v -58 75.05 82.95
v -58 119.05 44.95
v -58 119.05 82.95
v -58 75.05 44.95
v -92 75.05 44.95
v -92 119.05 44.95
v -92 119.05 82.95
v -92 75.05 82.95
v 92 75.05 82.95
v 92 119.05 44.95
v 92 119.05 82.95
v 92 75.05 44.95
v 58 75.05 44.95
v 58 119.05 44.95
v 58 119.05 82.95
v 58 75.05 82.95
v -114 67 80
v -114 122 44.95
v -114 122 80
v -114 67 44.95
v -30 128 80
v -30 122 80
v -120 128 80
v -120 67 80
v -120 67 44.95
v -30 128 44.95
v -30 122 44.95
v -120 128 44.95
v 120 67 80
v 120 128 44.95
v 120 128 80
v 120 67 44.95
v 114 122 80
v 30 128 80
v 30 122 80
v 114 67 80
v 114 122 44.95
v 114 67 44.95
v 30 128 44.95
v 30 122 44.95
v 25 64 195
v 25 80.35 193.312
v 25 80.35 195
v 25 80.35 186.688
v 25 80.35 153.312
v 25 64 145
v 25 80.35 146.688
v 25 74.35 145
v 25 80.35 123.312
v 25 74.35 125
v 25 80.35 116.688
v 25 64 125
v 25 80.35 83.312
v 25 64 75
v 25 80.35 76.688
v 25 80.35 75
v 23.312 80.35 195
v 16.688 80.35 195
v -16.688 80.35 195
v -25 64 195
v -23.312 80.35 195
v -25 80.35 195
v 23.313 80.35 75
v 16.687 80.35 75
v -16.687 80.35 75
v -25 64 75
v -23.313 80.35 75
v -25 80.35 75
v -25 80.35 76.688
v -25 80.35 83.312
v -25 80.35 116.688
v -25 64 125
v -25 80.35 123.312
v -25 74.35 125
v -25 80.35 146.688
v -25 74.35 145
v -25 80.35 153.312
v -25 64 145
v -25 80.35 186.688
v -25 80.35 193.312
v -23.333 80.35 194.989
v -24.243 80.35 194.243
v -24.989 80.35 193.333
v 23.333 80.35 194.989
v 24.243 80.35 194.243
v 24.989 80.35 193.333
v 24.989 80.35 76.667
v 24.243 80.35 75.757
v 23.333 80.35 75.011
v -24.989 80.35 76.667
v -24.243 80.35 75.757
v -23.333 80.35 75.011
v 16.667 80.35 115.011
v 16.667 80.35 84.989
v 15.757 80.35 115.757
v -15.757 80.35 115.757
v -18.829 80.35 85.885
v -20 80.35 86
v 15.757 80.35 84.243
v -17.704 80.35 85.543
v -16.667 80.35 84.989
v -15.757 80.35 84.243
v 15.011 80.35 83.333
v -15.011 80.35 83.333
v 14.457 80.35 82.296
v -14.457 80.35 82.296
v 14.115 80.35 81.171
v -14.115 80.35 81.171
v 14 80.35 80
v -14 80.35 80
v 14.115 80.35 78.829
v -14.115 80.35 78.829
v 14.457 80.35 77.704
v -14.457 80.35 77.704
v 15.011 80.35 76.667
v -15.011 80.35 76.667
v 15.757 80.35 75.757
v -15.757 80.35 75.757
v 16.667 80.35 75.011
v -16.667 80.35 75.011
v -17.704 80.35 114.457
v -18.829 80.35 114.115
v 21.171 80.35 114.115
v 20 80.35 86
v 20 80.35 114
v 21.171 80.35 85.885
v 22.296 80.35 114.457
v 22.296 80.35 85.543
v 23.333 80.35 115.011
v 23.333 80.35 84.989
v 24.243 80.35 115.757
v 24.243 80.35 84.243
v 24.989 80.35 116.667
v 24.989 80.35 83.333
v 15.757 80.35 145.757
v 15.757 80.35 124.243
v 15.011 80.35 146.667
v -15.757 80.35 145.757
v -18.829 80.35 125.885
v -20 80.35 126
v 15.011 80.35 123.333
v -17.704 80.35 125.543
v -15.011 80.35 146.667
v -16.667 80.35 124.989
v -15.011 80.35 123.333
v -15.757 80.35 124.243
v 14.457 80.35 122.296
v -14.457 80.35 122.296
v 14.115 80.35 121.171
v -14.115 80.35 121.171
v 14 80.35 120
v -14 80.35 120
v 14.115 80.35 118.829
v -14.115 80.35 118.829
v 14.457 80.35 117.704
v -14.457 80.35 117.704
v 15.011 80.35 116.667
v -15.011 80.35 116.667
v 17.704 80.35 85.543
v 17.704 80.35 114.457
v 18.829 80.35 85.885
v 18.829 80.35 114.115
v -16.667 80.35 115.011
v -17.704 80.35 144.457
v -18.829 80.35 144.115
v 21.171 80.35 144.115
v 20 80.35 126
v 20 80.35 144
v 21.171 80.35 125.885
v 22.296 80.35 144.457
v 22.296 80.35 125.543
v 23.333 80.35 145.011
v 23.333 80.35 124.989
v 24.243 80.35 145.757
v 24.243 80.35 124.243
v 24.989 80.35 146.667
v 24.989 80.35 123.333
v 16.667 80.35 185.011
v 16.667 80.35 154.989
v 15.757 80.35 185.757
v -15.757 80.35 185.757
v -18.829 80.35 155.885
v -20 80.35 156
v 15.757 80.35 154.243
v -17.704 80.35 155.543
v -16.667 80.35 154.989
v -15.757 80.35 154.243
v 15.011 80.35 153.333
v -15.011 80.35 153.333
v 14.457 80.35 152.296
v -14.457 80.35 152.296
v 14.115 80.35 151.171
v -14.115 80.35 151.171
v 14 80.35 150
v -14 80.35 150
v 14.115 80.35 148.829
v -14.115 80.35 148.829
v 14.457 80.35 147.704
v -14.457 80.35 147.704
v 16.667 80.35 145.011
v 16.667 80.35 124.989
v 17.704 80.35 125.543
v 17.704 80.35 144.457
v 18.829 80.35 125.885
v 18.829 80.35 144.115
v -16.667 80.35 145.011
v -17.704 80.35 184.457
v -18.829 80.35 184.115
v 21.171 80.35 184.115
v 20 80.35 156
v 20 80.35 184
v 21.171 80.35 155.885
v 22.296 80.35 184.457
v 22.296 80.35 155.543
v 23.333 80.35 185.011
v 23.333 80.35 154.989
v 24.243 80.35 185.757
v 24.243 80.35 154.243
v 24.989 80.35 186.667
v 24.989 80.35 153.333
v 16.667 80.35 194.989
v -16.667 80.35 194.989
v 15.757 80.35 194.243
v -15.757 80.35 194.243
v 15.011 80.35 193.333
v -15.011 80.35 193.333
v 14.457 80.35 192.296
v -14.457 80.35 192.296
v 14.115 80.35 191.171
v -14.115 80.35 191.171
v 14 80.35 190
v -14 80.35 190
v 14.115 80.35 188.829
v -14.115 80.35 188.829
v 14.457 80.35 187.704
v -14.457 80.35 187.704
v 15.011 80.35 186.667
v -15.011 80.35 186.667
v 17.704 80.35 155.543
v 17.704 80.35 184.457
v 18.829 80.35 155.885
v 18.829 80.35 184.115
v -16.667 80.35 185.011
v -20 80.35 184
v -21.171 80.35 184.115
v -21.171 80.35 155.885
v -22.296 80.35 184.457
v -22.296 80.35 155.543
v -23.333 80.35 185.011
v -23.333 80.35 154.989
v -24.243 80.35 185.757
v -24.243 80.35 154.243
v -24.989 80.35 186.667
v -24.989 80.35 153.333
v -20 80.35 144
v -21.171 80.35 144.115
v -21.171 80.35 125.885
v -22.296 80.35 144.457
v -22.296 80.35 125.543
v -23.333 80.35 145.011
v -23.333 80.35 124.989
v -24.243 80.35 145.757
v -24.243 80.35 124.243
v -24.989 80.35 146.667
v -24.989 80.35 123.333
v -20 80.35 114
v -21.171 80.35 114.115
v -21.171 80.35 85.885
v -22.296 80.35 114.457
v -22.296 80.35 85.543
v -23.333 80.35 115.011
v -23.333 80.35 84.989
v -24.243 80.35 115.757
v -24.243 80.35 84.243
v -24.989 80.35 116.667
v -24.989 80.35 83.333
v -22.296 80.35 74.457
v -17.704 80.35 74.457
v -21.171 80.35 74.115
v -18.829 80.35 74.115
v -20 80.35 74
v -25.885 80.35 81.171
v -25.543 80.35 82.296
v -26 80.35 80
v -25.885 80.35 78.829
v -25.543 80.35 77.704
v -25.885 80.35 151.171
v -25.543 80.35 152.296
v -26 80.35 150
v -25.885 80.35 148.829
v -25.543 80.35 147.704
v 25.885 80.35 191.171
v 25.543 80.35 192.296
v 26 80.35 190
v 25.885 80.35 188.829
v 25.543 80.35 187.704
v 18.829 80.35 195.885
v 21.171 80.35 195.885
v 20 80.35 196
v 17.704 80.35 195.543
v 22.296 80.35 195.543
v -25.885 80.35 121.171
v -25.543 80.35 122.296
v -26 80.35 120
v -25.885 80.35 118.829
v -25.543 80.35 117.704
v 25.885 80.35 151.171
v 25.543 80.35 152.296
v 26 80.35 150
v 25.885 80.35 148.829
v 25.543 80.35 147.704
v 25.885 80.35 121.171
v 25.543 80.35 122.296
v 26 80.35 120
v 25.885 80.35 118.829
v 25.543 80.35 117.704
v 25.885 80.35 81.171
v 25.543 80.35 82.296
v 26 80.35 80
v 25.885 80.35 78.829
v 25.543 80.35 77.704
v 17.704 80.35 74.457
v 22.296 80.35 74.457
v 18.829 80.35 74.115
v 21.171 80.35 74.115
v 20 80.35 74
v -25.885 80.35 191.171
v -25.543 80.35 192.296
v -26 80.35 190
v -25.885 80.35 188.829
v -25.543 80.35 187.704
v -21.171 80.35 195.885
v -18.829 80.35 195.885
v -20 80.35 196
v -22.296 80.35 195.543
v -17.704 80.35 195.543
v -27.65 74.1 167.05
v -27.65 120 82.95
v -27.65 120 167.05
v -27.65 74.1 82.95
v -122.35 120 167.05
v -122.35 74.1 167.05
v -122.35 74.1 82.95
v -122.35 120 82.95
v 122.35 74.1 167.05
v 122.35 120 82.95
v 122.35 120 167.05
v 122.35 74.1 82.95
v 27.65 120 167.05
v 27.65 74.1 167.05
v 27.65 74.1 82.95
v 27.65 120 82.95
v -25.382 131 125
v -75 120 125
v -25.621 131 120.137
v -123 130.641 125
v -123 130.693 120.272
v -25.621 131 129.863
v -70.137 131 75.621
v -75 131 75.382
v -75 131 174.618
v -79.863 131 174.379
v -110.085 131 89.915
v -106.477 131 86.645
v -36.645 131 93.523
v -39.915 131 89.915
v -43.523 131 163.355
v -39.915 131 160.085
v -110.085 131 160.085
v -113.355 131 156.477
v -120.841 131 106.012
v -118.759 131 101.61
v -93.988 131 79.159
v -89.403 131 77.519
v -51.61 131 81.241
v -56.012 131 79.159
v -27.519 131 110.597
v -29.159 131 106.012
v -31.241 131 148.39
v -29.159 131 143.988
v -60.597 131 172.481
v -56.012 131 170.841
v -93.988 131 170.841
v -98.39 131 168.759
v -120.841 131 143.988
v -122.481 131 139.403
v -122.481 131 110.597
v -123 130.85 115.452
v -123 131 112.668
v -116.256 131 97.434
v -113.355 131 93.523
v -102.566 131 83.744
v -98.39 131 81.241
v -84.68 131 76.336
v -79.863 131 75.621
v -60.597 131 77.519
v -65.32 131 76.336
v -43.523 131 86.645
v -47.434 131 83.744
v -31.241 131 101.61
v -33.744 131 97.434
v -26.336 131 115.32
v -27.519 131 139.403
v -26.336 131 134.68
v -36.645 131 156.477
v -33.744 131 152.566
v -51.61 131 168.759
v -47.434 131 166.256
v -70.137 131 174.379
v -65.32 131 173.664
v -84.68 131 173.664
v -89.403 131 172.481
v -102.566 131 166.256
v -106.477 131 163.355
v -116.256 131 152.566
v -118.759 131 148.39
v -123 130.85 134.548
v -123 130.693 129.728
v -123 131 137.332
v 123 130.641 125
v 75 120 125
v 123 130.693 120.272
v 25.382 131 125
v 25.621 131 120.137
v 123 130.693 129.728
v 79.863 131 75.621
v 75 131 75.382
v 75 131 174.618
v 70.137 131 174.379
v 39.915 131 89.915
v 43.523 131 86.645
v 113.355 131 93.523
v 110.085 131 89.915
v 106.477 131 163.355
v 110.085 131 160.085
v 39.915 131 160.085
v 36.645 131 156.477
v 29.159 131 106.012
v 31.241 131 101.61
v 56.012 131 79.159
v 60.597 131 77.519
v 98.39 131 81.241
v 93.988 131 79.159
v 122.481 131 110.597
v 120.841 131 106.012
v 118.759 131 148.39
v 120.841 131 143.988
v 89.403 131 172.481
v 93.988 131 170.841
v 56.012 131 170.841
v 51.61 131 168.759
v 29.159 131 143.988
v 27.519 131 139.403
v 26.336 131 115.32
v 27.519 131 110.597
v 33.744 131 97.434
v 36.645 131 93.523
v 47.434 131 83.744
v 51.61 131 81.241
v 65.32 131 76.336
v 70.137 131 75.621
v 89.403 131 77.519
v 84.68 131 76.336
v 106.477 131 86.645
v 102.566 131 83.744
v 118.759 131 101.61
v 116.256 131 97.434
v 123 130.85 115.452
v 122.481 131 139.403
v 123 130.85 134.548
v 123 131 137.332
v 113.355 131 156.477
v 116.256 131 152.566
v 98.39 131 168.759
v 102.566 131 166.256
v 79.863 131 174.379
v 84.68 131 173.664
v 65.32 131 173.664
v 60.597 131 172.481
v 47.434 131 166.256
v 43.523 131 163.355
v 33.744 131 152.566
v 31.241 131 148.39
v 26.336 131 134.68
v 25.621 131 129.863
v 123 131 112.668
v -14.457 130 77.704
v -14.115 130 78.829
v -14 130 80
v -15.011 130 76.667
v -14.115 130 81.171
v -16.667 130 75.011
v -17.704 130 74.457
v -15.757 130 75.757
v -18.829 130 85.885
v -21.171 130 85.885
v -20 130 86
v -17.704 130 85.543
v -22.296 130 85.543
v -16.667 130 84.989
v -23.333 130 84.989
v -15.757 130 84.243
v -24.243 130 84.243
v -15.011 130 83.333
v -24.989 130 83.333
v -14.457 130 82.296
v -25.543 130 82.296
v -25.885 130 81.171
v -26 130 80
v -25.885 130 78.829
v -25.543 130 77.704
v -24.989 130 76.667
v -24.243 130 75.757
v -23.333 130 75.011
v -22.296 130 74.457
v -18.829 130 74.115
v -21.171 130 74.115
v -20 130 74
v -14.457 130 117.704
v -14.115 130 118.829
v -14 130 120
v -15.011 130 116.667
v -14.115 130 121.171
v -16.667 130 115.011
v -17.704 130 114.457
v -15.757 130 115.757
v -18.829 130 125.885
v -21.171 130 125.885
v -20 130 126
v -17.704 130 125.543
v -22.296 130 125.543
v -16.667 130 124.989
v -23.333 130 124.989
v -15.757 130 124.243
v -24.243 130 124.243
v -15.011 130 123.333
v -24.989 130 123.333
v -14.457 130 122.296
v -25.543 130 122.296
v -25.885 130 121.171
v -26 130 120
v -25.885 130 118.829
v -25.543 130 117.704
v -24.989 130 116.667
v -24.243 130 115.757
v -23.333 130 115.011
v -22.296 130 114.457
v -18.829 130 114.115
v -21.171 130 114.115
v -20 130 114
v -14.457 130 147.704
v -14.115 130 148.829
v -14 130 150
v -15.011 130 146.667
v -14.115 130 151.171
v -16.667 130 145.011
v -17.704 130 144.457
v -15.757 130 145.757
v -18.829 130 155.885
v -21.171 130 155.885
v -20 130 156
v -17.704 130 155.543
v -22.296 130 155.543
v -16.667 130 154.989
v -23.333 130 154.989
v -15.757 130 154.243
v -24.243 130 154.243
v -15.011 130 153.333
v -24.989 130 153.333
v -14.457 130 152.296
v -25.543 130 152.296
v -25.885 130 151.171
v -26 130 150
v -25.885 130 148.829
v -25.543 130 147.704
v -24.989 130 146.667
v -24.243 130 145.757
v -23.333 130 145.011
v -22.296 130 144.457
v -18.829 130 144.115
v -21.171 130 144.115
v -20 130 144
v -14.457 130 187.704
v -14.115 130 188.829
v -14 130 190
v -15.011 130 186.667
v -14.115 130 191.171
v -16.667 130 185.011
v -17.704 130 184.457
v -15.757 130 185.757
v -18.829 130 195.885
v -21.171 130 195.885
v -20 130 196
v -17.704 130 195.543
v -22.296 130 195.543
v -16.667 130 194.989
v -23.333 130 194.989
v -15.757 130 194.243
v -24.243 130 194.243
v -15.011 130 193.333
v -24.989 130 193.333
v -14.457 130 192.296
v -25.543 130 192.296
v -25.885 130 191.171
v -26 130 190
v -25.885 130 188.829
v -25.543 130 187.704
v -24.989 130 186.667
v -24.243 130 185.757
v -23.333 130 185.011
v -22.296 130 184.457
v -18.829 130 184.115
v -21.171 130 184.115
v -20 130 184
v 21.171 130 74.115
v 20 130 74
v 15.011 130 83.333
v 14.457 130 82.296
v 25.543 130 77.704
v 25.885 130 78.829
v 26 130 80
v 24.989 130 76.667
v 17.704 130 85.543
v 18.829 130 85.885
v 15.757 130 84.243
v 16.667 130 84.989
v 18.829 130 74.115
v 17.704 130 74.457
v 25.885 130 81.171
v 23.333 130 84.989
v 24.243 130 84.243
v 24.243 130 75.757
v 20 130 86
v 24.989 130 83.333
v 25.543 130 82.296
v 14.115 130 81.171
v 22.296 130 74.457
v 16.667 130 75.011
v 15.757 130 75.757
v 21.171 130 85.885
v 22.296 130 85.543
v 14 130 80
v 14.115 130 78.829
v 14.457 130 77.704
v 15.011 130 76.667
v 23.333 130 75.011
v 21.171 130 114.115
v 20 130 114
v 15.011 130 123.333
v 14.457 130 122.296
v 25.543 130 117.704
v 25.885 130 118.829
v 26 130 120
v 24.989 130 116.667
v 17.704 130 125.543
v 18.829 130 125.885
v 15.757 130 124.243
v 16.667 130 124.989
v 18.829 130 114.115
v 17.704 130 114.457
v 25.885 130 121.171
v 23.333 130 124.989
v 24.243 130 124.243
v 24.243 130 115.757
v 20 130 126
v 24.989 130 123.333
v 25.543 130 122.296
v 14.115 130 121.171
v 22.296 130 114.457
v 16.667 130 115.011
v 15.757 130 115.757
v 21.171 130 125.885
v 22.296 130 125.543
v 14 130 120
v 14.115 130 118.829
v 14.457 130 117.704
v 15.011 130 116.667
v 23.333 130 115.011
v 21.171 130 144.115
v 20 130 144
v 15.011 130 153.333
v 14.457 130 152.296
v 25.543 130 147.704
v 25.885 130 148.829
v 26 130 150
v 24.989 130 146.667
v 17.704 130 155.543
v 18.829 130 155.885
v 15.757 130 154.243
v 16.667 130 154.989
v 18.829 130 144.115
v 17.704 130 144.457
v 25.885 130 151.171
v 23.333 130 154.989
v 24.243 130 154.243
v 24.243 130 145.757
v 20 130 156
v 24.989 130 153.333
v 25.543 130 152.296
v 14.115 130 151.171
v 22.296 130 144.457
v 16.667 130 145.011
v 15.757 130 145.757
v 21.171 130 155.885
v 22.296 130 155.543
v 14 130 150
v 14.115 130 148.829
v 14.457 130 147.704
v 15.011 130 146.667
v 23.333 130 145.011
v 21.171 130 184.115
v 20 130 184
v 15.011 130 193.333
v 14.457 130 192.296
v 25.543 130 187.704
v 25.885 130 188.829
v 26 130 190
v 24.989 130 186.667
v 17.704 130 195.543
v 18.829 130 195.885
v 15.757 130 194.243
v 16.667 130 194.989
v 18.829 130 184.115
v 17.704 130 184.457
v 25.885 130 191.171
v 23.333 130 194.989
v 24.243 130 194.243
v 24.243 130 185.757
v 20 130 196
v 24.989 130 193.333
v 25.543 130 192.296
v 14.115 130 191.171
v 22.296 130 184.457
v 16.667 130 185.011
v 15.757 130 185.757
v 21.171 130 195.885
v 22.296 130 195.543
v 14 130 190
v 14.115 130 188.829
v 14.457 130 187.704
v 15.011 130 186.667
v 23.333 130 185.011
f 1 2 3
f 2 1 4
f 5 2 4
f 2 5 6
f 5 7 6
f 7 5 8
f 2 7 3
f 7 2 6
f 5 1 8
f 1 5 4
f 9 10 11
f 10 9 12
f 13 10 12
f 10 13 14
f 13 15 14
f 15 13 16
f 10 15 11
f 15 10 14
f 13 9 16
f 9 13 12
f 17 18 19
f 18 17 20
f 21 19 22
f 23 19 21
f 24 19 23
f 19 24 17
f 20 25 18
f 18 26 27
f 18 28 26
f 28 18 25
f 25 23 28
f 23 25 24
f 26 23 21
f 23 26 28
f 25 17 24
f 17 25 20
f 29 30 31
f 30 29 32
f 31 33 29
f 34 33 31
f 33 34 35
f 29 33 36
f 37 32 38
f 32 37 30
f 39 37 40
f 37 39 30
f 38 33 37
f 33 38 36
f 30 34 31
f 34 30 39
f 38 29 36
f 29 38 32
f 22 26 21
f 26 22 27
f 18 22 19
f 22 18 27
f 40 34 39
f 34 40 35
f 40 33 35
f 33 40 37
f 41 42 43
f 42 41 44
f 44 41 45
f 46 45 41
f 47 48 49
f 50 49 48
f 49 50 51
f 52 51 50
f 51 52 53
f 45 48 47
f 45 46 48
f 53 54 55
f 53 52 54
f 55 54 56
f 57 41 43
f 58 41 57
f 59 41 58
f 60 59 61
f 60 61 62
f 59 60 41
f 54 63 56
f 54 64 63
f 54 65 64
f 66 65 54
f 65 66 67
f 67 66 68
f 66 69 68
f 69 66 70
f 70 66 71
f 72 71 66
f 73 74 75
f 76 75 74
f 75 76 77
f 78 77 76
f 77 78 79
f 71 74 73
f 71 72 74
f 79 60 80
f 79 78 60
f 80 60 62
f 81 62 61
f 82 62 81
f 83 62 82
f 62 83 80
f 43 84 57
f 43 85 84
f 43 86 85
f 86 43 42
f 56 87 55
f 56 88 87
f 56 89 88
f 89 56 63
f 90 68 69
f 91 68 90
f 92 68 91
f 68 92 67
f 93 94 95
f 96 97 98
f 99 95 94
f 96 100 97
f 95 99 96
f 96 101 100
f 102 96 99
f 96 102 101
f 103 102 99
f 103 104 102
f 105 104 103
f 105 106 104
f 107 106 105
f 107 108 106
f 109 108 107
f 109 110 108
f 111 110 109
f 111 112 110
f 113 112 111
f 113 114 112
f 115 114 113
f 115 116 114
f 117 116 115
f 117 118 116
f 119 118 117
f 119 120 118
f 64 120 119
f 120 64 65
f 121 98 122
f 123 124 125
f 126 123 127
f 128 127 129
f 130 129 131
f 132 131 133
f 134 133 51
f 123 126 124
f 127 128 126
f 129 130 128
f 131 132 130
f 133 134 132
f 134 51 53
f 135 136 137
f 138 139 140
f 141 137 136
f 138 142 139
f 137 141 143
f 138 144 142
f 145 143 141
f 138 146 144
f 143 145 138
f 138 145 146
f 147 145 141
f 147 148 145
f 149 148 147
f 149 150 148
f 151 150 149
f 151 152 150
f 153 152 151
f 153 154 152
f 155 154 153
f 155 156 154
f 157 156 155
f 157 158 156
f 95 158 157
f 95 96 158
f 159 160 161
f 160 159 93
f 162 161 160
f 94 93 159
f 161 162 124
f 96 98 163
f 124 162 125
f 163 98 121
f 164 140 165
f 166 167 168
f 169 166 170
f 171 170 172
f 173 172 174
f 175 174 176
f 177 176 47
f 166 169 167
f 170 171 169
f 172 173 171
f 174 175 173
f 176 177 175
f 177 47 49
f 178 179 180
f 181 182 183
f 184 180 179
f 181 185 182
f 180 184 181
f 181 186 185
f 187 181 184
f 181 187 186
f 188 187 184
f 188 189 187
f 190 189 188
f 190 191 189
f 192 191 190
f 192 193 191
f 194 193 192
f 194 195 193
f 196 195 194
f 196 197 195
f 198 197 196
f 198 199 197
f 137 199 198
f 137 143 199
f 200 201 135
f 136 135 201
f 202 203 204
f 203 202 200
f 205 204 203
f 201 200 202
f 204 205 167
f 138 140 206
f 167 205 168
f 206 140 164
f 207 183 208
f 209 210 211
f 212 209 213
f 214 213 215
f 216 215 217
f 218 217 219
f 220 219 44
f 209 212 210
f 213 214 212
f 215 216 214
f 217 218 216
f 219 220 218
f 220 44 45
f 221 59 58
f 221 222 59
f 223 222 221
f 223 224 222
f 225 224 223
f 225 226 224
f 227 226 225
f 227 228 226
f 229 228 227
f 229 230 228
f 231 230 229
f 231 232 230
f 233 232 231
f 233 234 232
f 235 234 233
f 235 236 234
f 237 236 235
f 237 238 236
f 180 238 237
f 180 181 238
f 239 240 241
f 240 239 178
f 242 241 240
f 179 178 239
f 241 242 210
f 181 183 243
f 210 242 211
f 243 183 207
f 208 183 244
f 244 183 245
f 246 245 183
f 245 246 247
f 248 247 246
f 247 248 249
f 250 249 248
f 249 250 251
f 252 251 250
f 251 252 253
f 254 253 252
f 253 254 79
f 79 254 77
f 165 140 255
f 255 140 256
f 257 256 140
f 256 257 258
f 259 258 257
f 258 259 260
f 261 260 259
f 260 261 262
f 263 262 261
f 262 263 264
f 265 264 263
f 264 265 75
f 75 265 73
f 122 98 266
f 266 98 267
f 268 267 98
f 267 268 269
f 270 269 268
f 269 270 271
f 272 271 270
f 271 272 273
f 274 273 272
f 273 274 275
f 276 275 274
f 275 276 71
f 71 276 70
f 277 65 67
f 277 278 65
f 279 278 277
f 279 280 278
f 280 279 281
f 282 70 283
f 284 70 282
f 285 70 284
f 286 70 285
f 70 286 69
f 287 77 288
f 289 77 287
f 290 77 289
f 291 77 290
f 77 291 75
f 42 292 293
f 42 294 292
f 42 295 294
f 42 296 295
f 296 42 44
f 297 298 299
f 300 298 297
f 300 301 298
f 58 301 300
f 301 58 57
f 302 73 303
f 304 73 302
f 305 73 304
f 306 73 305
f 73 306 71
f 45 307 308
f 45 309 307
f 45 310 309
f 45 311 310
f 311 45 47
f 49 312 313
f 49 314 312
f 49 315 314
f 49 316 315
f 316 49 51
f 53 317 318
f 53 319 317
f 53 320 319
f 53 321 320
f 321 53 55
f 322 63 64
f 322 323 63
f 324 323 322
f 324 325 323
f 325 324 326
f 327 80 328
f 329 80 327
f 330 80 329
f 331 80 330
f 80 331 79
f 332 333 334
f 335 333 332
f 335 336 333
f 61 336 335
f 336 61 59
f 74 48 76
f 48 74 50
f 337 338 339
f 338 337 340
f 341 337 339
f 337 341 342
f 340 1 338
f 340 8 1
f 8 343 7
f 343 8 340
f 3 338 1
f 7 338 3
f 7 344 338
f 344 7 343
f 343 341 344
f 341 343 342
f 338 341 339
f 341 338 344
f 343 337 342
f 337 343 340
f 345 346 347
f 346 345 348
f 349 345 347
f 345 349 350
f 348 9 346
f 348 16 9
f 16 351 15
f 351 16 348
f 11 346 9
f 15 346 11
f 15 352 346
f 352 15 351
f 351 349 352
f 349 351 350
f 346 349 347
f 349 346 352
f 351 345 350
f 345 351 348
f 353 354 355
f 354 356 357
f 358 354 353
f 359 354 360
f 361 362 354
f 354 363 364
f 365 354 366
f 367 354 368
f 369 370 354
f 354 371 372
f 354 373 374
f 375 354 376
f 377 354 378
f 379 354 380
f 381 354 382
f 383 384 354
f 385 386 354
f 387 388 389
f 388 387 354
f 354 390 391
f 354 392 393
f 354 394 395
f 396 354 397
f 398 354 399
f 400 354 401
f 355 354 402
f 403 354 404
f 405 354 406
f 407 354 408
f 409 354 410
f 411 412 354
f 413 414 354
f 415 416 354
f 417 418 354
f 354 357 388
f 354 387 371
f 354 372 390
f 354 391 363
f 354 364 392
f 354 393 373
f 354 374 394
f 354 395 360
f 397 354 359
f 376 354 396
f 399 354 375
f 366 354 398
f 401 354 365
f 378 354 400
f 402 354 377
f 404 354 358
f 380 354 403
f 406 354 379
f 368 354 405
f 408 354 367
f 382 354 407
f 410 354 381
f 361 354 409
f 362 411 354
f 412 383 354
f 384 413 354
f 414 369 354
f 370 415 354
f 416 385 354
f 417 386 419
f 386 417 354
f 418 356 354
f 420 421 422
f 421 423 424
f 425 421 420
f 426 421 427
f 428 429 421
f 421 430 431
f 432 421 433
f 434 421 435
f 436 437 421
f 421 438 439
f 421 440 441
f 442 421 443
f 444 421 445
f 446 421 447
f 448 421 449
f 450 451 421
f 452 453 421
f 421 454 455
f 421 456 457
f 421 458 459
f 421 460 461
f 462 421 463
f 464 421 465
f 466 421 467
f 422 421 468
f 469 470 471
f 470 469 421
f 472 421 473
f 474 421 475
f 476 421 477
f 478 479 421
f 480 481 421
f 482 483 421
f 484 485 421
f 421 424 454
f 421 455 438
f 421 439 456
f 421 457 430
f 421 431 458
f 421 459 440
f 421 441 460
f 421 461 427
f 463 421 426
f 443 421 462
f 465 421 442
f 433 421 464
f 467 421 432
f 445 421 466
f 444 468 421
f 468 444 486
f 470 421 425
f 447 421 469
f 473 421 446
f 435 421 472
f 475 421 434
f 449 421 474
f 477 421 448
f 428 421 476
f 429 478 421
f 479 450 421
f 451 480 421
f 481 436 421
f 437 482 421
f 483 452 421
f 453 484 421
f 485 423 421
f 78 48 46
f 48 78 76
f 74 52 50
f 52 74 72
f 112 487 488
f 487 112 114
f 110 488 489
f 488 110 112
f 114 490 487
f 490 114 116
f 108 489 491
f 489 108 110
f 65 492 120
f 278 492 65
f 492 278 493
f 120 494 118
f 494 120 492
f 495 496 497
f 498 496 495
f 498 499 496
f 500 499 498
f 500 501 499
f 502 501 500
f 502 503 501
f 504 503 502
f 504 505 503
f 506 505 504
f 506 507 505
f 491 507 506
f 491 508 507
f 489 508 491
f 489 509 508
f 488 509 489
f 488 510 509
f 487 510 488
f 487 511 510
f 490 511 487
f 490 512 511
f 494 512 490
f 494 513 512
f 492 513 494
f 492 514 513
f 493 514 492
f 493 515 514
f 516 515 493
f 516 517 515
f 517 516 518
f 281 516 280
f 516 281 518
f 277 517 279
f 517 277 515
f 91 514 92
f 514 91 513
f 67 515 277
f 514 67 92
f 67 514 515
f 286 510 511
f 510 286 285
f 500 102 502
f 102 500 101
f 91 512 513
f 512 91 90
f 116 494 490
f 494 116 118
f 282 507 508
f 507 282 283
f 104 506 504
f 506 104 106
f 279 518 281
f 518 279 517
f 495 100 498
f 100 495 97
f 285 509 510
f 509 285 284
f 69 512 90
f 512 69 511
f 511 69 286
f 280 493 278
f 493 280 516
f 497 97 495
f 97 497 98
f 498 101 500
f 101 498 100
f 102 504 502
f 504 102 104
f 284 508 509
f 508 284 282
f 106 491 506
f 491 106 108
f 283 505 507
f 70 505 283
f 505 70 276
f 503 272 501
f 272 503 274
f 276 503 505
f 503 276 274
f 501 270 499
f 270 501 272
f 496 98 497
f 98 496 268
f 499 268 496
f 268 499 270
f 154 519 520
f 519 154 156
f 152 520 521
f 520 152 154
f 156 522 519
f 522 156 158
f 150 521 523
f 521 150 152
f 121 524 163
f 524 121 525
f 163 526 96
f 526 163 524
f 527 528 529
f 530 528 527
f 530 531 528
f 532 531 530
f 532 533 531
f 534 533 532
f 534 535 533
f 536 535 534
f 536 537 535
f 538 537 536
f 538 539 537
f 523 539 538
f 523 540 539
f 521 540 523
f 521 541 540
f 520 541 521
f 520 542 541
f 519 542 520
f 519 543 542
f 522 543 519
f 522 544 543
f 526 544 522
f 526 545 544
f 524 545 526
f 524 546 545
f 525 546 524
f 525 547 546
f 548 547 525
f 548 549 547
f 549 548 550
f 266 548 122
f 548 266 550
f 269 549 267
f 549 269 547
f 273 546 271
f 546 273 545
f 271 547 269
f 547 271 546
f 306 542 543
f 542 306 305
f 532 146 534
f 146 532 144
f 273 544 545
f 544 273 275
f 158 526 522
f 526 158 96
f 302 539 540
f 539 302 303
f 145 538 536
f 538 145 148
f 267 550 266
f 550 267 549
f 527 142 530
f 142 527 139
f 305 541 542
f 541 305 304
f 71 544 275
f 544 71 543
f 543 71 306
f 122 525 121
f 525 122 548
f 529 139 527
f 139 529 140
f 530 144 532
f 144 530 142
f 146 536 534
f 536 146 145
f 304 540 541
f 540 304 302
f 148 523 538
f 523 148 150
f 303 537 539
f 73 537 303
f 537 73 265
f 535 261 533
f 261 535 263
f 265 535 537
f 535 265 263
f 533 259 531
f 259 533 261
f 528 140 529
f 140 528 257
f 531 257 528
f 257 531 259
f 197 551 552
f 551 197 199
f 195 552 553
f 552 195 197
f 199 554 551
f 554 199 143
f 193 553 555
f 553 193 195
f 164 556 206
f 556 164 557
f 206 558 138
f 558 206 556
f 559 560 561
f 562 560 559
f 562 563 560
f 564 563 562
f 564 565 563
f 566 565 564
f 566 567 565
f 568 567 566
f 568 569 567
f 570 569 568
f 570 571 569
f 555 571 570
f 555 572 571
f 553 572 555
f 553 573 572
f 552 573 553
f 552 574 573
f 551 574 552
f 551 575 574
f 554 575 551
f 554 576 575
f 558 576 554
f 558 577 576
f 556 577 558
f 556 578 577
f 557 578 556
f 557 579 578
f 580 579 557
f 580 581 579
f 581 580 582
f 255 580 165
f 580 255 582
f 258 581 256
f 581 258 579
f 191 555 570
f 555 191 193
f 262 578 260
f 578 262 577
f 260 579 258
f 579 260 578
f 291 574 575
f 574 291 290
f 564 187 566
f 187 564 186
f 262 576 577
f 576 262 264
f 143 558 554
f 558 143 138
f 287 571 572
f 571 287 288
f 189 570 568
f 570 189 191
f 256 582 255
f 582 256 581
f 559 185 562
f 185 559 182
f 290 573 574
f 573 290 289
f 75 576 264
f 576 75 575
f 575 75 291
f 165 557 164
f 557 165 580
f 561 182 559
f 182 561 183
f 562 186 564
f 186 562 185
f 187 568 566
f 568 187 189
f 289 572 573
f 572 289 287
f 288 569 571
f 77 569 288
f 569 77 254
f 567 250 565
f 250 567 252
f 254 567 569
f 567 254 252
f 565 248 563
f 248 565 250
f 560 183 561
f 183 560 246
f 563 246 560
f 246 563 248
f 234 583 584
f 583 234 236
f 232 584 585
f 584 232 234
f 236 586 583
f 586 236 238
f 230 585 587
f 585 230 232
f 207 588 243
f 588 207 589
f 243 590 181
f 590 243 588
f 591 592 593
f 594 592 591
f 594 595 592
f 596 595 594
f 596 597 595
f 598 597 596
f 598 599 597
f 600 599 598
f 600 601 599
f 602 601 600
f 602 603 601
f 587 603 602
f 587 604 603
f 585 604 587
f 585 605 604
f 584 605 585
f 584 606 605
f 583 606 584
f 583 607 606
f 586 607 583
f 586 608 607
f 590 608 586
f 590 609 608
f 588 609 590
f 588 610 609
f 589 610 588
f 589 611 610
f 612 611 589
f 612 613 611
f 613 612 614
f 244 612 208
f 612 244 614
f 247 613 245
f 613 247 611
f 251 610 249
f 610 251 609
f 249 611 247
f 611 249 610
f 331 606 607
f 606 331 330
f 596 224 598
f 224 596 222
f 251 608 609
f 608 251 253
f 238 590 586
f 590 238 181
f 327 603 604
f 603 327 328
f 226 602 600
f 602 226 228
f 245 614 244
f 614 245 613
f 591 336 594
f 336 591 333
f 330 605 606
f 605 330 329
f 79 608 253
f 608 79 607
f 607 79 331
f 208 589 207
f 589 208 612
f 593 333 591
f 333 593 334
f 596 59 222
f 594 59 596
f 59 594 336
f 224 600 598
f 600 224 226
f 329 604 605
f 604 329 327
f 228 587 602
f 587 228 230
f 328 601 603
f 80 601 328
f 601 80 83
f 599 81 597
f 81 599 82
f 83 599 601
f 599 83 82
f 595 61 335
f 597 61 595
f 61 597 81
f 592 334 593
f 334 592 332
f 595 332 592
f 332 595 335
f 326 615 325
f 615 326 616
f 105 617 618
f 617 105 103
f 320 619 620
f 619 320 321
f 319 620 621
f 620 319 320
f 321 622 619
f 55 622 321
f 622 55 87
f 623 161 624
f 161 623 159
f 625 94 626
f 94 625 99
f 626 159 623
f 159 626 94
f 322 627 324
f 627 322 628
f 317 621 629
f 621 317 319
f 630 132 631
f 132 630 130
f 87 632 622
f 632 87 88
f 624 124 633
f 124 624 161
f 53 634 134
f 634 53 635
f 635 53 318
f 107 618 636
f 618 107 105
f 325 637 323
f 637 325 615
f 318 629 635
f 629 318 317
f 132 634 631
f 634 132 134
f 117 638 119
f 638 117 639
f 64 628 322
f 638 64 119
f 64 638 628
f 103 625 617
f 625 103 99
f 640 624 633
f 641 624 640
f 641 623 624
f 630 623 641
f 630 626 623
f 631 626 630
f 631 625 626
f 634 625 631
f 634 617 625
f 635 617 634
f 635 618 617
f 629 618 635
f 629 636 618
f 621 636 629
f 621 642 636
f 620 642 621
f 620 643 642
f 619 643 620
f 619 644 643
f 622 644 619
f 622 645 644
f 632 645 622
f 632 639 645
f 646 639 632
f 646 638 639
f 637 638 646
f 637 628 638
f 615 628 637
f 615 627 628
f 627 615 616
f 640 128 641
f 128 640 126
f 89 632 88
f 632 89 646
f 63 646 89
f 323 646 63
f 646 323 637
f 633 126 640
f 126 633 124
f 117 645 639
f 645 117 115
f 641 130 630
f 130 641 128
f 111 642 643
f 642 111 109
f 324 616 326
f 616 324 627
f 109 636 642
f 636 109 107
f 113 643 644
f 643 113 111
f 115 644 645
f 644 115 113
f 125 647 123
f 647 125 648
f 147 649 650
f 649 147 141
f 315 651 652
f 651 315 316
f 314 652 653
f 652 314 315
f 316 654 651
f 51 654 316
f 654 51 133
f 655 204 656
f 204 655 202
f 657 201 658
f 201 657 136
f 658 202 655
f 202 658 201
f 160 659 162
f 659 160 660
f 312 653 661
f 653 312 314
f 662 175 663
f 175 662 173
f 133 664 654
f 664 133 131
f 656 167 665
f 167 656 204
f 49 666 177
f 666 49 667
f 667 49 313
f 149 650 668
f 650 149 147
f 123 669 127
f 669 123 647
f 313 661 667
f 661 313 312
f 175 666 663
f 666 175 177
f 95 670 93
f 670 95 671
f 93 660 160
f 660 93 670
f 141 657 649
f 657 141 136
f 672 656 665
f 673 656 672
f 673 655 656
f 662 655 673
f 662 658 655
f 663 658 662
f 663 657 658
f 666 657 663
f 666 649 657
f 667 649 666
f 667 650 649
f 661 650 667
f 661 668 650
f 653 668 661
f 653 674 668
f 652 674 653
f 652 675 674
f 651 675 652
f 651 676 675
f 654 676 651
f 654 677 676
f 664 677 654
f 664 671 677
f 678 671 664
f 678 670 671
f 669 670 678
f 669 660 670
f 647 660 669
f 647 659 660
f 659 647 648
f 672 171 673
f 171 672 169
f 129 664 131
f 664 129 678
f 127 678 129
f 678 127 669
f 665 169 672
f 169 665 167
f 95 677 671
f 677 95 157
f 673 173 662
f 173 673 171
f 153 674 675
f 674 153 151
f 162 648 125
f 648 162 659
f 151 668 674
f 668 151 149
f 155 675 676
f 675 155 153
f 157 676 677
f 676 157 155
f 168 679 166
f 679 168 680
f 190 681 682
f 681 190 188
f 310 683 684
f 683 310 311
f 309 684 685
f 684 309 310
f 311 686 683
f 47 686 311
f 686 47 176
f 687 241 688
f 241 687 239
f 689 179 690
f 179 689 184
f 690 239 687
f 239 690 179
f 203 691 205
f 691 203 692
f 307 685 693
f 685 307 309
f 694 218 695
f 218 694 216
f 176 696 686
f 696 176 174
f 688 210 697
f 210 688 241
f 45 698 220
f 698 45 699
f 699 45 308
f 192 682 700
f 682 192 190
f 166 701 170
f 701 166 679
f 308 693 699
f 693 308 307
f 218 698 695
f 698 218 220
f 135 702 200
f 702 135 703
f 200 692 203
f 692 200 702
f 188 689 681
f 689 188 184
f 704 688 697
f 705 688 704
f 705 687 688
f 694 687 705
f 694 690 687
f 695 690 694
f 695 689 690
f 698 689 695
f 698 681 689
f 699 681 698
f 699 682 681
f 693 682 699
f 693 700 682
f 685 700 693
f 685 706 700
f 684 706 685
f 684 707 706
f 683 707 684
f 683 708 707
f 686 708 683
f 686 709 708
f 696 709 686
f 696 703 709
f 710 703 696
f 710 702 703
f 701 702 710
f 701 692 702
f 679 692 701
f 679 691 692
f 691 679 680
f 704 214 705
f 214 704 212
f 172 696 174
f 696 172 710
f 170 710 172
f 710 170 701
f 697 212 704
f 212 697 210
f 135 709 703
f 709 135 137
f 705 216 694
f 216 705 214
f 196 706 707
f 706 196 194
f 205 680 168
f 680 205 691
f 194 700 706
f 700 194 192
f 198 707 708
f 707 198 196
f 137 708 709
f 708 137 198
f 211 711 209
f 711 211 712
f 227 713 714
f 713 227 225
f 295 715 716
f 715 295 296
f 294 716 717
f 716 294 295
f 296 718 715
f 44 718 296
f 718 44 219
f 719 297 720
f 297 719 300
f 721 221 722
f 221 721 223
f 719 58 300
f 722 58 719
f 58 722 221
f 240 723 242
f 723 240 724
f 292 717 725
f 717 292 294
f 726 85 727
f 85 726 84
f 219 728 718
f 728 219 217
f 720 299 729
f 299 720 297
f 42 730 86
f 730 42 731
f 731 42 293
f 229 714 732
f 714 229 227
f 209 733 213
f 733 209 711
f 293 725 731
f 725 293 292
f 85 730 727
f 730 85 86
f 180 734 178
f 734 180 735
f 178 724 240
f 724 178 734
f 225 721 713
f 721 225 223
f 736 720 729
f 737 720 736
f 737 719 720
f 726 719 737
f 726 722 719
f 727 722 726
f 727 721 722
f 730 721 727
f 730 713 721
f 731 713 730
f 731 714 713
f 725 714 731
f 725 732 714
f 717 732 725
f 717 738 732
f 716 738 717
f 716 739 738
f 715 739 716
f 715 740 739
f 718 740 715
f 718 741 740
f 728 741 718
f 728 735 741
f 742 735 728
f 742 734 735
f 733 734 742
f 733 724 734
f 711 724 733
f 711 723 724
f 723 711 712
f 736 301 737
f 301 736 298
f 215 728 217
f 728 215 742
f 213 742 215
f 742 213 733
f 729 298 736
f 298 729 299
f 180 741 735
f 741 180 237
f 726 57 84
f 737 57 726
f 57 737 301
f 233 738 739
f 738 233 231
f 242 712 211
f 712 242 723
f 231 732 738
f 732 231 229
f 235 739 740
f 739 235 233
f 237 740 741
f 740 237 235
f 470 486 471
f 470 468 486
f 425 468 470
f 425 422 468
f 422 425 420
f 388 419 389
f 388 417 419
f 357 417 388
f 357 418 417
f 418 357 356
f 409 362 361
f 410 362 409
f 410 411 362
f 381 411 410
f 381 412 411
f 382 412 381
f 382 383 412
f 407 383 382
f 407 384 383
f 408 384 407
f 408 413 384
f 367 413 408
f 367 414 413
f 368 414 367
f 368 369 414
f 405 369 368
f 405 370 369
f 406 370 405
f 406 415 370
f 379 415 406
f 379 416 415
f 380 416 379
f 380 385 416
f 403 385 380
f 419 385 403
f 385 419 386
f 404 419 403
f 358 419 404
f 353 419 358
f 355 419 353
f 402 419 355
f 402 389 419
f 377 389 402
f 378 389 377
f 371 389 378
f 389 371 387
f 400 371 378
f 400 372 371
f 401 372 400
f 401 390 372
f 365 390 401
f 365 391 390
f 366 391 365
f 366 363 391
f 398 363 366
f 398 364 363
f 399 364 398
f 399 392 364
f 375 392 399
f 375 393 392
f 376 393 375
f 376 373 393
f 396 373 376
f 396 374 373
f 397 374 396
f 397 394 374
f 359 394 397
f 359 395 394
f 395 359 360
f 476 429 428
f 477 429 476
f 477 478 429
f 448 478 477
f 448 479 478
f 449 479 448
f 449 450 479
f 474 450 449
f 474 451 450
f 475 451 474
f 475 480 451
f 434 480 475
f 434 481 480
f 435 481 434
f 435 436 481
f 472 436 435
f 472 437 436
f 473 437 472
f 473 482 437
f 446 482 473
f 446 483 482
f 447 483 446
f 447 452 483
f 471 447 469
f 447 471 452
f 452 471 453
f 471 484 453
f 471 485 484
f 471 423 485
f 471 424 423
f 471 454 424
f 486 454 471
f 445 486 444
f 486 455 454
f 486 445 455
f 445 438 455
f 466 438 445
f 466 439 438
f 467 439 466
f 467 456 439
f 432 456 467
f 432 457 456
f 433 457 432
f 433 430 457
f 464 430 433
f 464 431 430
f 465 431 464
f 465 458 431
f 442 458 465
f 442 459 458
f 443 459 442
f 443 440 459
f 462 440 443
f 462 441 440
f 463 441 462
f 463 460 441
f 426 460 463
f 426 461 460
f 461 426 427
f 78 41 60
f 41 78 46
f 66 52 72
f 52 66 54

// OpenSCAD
// =====================================================================
// child_cam_bridge_v1.scad — カメラブリッジ トポロジー最適化の設計空間定義
//
// 現行 child_cam_bridge (328.1 cm³) を「機能面 = preserve」「空けておく空間 =
// obstacle」「残り = design_space」に分解して topopt (TO_printing/topopt) に渡す。
// **部品そのものではない。**
//
// 寸法はすべて child_cam_bridge.scad / child_side_bumper.scad / child_jaw_gate.scad
// の Customizer 値をそのまま再掲した **二重定義** である。元ファイルを直したら
// ここも直すこと (Body_Models/CLAUDE.md 設計規約 4)。
//
// part= で出力を選ぶ:
//   preserve       絶対に残す機能面 (密度 1)。小穴 (M5・ナットトラップ) は
//                  中実のまま置き、finish 段の cuts で切る
//   obstacle       絶対に空けておく空間 (密度 0)。design_space で切り、
//                  preserve を引いてから渡す
//   design_space   最適化が材料を置いてよい空間 (現行 bbox と同じ単純な箱)
//   preserve_solid finish 段で足し戻す形 (= preserve)
//   preserve_cuts  finish 段で引く穴 (obstacle 全部 + 小穴)
//   reference      人が見る用 (preserve 緑 + obstacle 赤 + design_space 灰)
//
// 座標系: 機体グローバル。X 左右 (基線) / Y 前後 (+Y 前 = カメラ向き) / Z 上。
// build_axis = Y (印刷は +Y up。md「印刷」節: 中央柱を床にした +Y up)。
// =====================================================================

/* [Build] */
part = "reference";  // [reference, preserve, obstacle, design_space, preserve_solid, preserve_cuts]

/* [HP40 / child_jaw_gate 側 (二重定義: child_jaw_gate.scad, child_cam_bridge.scad)] */
hp4_z         = 170;    // HP4 座中心 z
hp5_z         = 100;    // HP5 座中心 z
hpl_z         = 15;     // HP-L 座中心 z
hp_half       = 25;     // 座 (シェルフ) 半幅 (x, z とも)
hp_seat_y     = 74.35;  // 座面 (共通平面)。法線 +Y
hp_shelf_dep  = 12;     // シェルフ奥行き (座面から -Y へ)
hp_pitch_half = 20;     // M5 穴オフセット
hp_bolt_d     = 5.4;    // M5 クリアランス
adapter_t     = 6;      // 中央柱の板厚 (y)
gate_r_out    = 64.35;  // ゲート殻外径半径

/* [child_cam_mount 側 (二重定義: child_cam_mount.scad, child_cam_bridge.scad)] */
cm_lens_off_bot = 42.05;
cm_fin_x1       = 30;
cm_case_d       = 45.9;   // ケース奥行 (機体 Y)
cm_case_w       = 94.7;   // ケース幅 (横向きでは機体 X)
cm_case_h       = 84.1;   // ケース高さ (横向きでは機体 Z)
cm_plate_hw     = 22;     // 背面プレート半幅 (機体 Y)
cm_plate_hh     = 17;     // 背面プレート半高 (機体 X)
cm_fh_y         = 16;     // フレーム穴 Y オフセット
cm_fh_z         = 11;     // フレーム穴 X オフセット

/* [カメラ配置 (二重定義: child_cam_bridge.scad)] */
lens_z      = 125;
lens_x      = 75;
cam_y_shift = 14;
lens_y      = 106 + cam_y_shift;   // 120 (レンズ面)
fov_half    = 77.5;   // 対角 FOV 155° の半角 (水平 145° = 半角 72.5 を内包する保守側)
hood_len    = 8;      // レンズ面より前に material を許す量 (要件書 §2「フード 8mm 相当」)

/* [デッキ / 中央柱 / ウイング (二重定義: child_cam_bridge.scad)] */
deck_t       = 8;
deck_top     = lens_z - cm_lens_off_bot - cm_fin_x1;  // 52.95
deck_bot     = deck_top - deck_t;                     // 44.95
col_hw       = hp_half;                 // 25
col_y0       = hp_seat_y;               // 74.35
col_y1       = hp_seat_y + adapter_t;   // 80.35
wing_x1      = 120;    // ウイング外端 x (= 240 枠の半分)
end_plate_t  = 6;
end_plate_z1 = 80;
front_web_y0 = lens_y + 2;   // 122 (レンズ面より 2mm 前 = 前縁バンパ前面の後ろ側)
front_web_y1 = lens_y + 8;   // 128 (前縁バンパ前面 = フード限界)
rear_y0      = 67;     // 現行デッキ/後ウェブ後端 (ゲート殻 x=0 の y64.35 から 2.65mm)

/* [マウント取付穴 (二重定義: child_cam_bridge.scad)] */
m5_clear     = 5.4;
nut_af       = 8.2;
nut_dep      = 4.0;
mount_y0     = lens_y - cm_case_d / 2;                     // 97.05
mount_hole_y = [mount_y0 - cm_fh_y, mount_y0 + cm_fh_y];   // 81.05, 113.05
mount_hole_dx = cm_fh_z;                                   // 11

/* [側面バンパ取合い (二重定義: child_side_bumper.scad)] */
bumper_t    = 9;
case_gap    = 2;
bump_bolt_y = [80, 116];
bump_bolt_z = 65;

/* [工具アクセス] */
tool_d      = 12;    // HP4/HP5 の M5×8 を差す/回すための直線アクセス径

/* [設計空間 = 現行 bbox と同じ単純な箱 (240 x 61 x 150.05)] */
// 広げなかった理由:
//   x: ±120 が 240 枠 (md assert)。これ以上は side_bumper (内面 124.35) と衝突
//   y1: lens_y + 8 = 128 がフード限界 (要件書 §2)。奥行 250 枠 (149) より手前
//   y0: 67 がゲート殻 (r64.35) からの 2.65mm 離隔 (md assert)
//   z0: 44.95。ここより下げると マウント M5 のナットトラップ開口 (デッキ下面)
//       が埋まる。HP-L 座上端 (40) + 2 の制約より先にこちらが効く
//   z1: 195 = HP4 座上端 (md assert)
ds_x0 = -wing_x1;         // -120
ds_x1 =  wing_x1;         //  120
ds_y0 = rear_y0;          //  67
ds_y1 = front_web_y1;     //  128
ds_z0 = deck_bot;         //  44.95
ds_z1 = hp4_z + hp_half;  //  195

/* [preserve の切り出し寸法] */
pres_col_pad_hz = hp_half;    // 座パッドの z 半幅 (25 → HP4 145..195 / HP5 75..125)
pres_fb_x0      = 30;         // 前縁バンパ preserve の内端 (工具アクセス x26 から 4mm 離す)
pres_ep_x0      = wing_x1 - end_plate_t;  // 114

/* [Hidden] */
fudge = 0.01;
BIG   = 400;
$fn = 64;

// ---- 導出値 ---------------------------------------------------------
case_x0 = lens_x - cm_case_w / 2;    // 27.65
case_x1 = lens_x + cm_case_w / 2;    // 122.35
case_y0 = mount_y0 - cm_case_d / 2;  // 74.1
case_y1 = lens_y;                    // 120
case_z0 = deck_top + cm_fin_x1;      // 82.95
case_z1 = case_z0 + cm_case_h;       // 167.05
mp_x0   = lens_x - cm_plate_hh;      // 58
mp_x1   = lens_x + cm_plate_hh;      // 92
mp_y0   = mount_y0 - cm_plate_hw;    // 75.05
mp_y1   = mount_y0 + cm_plate_hw;    // 119.05
mp_z0   = deck_top;                  // 52.95
mp_z1   = case_z0;                   // 82.95
shelf_y0 = hp_seat_y - hp_shelf_dep; // 62.35
hp4_z0 = hp4_z - hp_half;  hp4_z1 = hp4_z + hp_half;   // 145 .. 195
hp5_z0 = hp5_z - hp_half;  hp5_z1 = hp5_z + hp_half;   //  75 .. 125
fov_r1 = hood_len * tan(fov_half);   // 36.09 (y = lens_y + 8 での視野半径)
tool_x = [-hp_pitch_half, hp_pitch_half];
tool_z = [hp5_z - hp_pitch_half, hp5_z + hp_pitch_half,
          hp4_z - hp_pitch_half, hp4_z + hp_pitch_half];   // 80,120,150,190

// ---- 検査 -----------------------------------------------------------
assert(ds_x1 - ds_x0 <= 240 && ds_y1 - ds_y0 <= 240 && ds_z1 - ds_z0 <= 240,
       "設計空間が X1C 実用枠 (250 - 余白 5x2 = 240) を超える");
assert(ds_y0 - gate_r_out >= 2.6, "設計空間後端がゲート殻 (r64.35) に 2.6mm 未満で接近");
assert(ds_z0 >= hpl_z + hp_half + 2, "設計空間下端が HP-L 座上端 (40) + 2 より低い");
assert(ds_z1 <= hp4_z + hp_half, "設計空間上端が HP4 座上端 (195) を超える");
assert(ds_y1 <= lens_y + hood_len, "設計空間前端がフード限界 (レンズ面 +8) を超える");
assert(case_x1 + case_gap + bumper_t <= 140, "側面バンパ外面が 280 枠 (半幅 140) を超える");
// FOV: preserve のうち最も前 (y=ds_y1) にある前縁バンパ/端板の最上端 z=80。
// レンズ軸 (lens_z=125) からの半径方向距離が視野半径 fov_r1 を上回ること。
fov_dz = lens_z - end_plate_z1;                 // 45
assert(fov_dz > fov_r1, "前縁バンパ/端板の上端が FOV 円錐 (半角 77.5°) に入る");
assert(atan(fov_dz / hood_len) > fov_half, "前縁バンパ前面が FOV 半角の内側");
// 工具アクセス (x 14..26) と 前縁バンパ preserve (x >= 30) が 1 ボクセル以上離れる
assert(pres_fb_x0 - (max(tool_x) + tool_d / 2) >= 3,
       "工具アクセス穴と前縁バンパ preserve が 3mm 未満で接近 (obstacle が preserve を貫く)");
assert(pres_ep_x0 > max(tool_x) + tool_d / 2, "工具アクセス穴が端板 preserve に届く");
echo(str("design_space = ", [ds_x1 - ds_x0, ds_y1 - ds_y0, ds_z1 - ds_z0],
         "  vol = ", (ds_x1-ds_x0)*(ds_y1-ds_y0)*(ds_z1-ds_z0), " mm3"));
echo(str("FOV: 半径 ", fov_r1, " @ y=", ds_y1, " / preserve 最近接 dz = ", fov_dz));

// ---- preserve / obstacle の AABB 総当り検査 ---------------------------
// box = [x0,x1,y0,y1,z0,z1]。厳密不等号なので面接触 (共有面) は非干渉扱い。
function box_overlap(a, b) =
    (a[0] < b[1]) && (b[0] < a[1]) &&
    (a[2] < b[3]) && (b[2] < a[3]) &&
    (a[4] < b[5]) && (b[4] < a[5]);

preserve_boxes = [
    ["column",   [-col_hw, col_hw, col_y0, col_y1, hp5_z0, hp4_z1]],
    ["mount_R",  [mp_x0, mp_x1, mp_y0, mp_y1, deck_bot, deck_top]],
    ["mount_L",  [-mp_x1, -mp_x0, mp_y0, mp_y1, deck_bot, deck_top]],
    ["endp_R",   [pres_ep_x0, wing_x1, ds_y0, ds_y1, deck_bot, end_plate_z1]],
    ["endp_L",   [-wing_x1, -pres_ep_x0, ds_y0, ds_y1, deck_bot, end_plate_z1]],
    ["fbump_R",  [pres_fb_x0, wing_x1, front_web_y0, front_web_y1, deck_bot, end_plate_z1]],
    ["fbump_L",  [-wing_x1, -pres_fb_x0, front_web_y0, front_web_y1, deck_bot, end_plate_z1]],
];

obstacle_boxes = concat([
    ["case_R",     [case_x0, case_x1, case_y0, case_y1, case_z0, case_z1]],
    ["case_L",     [-case_x1, -case_x0, case_y0, case_y1, case_z0, case_z1]],
    ["mplate_R",   [mp_x0, mp_x1, mp_y0, mp_y1, mp_z0, mp_z1]],
    ["mplate_L",   [-mp_x1, -mp_x0, mp_y0, mp_y1, mp_z0, mp_z1]],
    ["shelf_HP4",  [-hp_half, hp_half, shelf_y0, hp_seat_y, hp4_z0, hp4_z1]],
    ["shelf_HP5",  [-hp_half, hp_half, shelf_y0, hp_seat_y, hp5_z0, hp5_z1]],
], [ for (sx = tool_x, tz = tool_z)
       [str("tool_", sx, "_", tz),
        [sx - tool_d/2, sx + tool_d/2, col_y1, ds_y1 + 1, tz - tool_d/2, tz + tool_d/2]] ]);

for (pb = preserve_boxes)
    for (ob = obstacle_boxes)
        assert(!box_overlap(pb[1], ob[1]), str(pb[0], " が obstacle ", ob[0], " と交差する"));

// ---- obstacle の元 ----------------------------------------------------
// カメラ + 防水ケースの実体 (AABB、左右)
module cam_case() {
    for (s = [-1, 1])
        translate([s > 0 ? case_x0 : -case_x1, case_y0, case_z0])
            cube([case_x1 - case_x0, case_y1 - case_y0, case_z1 - case_z0]);
}
// child_cam_mount 本体 (背面プレート〜レジスタ面) の占有域
module cam_mount_body() {
    for (s = [-1, 1])
        translate([s > 0 ? mp_x0 : -mp_x1, mp_y0, mp_z0])
            cube([mp_x1 - mp_x0, mp_y1 - mp_y0, mp_z1 - mp_z0 + fudge]);  // ケースと面共有しないよう +fudge
}
// レンズの視野円錐 (半角 fov_half、レンズ面より前のみ。フード 8mm まで)
module fov_cone() {
    for (s = [-1, 1])
        translate([s * lens_x, lens_y, lens_z]) rotate([-90, 0, 0])
            cylinder(r1 = 0, r2 = (hood_len + 4) * tan(fov_half), h = hood_len + 4);
}
// ゲート HP シェルフ (HP4/HP5)。座面 y=74.35 より後ろの帯
module hp_shelves() {
    for (zc = [hp4_z, hp5_z])
        translate([-hp_half, shelf_y0, zc - hp_half])
            cube([2 * hp_half, hp_seat_y - shelf_y0, 2 * hp_half]);
}
// HP4/HP5 の M5x8 を差す/回す工具アクセス (座面前方 y80.35 から設計空間前端まで)
module tool_access() {
    for (sx = tool_x, tz = tool_z)
        translate([sx, col_y1, tz]) rotate([-90, 0, 0])
            cylinder(d = tool_d, h = ds_y1 - col_y1 + 2, $fn = 32);
}
module obstacle_declared() {
    cam_case();
    cam_mount_body();
    fov_cone();
    hp_shelves();
    tool_access();
}
// 設計空間の 1 ボクセルぶん外まででクリップする (領域外の obstacle はグリッドを
// 太らせるだけで何も保持しない — design-space.md「Cost」)
module ds_clip() {
    translate([ds_x0 - 3, ds_y0 - 3, ds_z0 - 3])
        cube([ds_x1 - ds_x0 + 6, ds_y1 - ds_y0 + 6, ds_z1 - ds_z0 + 6]);
}
module obstacle_all() {
    difference() {
        intersection() { obstacle_declared(); ds_clip(); }
        preserve_bodies();   // 小穴は preserve の中では obstacle にしない (finish 段で切る)
    }
}

// ---- preserve (機能面) ------------------------------------------------
module preserve_bodies() {
    // (1) 中央柱 = HP40 アダプタ板 (z 75..195 で連続): ゲートにボルト留めする面と
    //     M5x8 の座。**2026-09-05 v1a で HP4/HP5 の 2 パッドから連続板へ変更**。
    //     理由: 2 パッドを別々に置いて両方 fix xyz にすると HP5 だけで完全拘束が
    //     効いてしまい、最適化が HP4 を繋ぐ動機を持たない (v1 の run で HP4 パッド
    //     544 セルが単独コンポーネントとして残り connected=false になった)。
    //     現行部品も中央柱は z 44.95..195 の連続板であり、HP40 の 8 本は 1 枚の
    //     アダプタ板で受けるのが正しい取合い。
    translate([-col_hw, col_y0, hp5_z0])
        cube([2 * col_hw, col_y1 - col_y0, hp4_z1 - hp5_z0]);
    // (2) child_cam_mount の座 (デッキ厚全体。上面が register 面、下面がナットトラップ開口)
    for (s = [-1, 1])
        translate([s > 0 ? mp_x0 : -mp_x1, mp_y0, deck_bot])
            cube([mp_x1 - mp_x0, mp_y1 - mp_y0, deck_t]);
    // (3) 側面バンパ端板 (外面 x=±120 が バンパ L 形フットの密着面、M5x2 の座)
    for (s = [-1, 1])
        translate([s > 0 ? pres_ep_x0 : -wing_x1, ds_y0, deck_bot])
            cube([end_plate_t, ds_y1 - ds_y0, end_plate_z1 - deck_bot]);
    // (4) 前縁バンパ (レンズ面より 2mm 前 .. フード限界 8mm。L4 正面衝突の荷重導入面)
    for (s = [-1, 1])
        translate([s > 0 ? pres_fb_x0 : -wing_x1, front_web_y0, deck_bot])
            cube([wing_x1 - pres_fb_x0, front_web_y1 - front_web_y0,
                  end_plate_z1 - deck_bot]);
}
module preserve_all() { preserve_bodies(); }

// ---- design_space ------------------------------------------------------
module design_space() {
    translate([ds_x0, ds_y0, ds_z0])
        cube([ds_x1 - ds_x0, ds_y1 - ds_y0, ds_z1 - ds_z0]);
}

// ---- 小穴 (preserve の中を通る。解析では中実、finish 段で切る) ------------
// HP4/HP5 の M5x8 (軸 Y、中央柱を貫通)
module column_holes() {
    for (zc = [hp4_z, hp5_z], sx = tool_x, sz = [-hp_pitch_half, hp_pitch_half])
        translate([sx, col_y0 - fudge, zc + sz]) rotate([-90, 0, 0])
            cylinder(d = hp_bolt_d, h = adapter_t + 2 * fudge, $fn = 32);
}
// マウント M5 通し穴 + 下面ナットトラップ (軸 Z) — child_cam_bridge.scad の mount_bolt()
module mount_bolt(x, y) {
    translate([x, y, deck_bot - fudge]) cylinder(d = m5_clear, h = deck_t + 2*fudge, $fn = 32);
    translate([x, y, deck_bot - fudge]) cylinder(d = nut_af / cos(30), h = nut_dep + fudge, $fn = 6);
    translate([x, y, deck_bot + nut_dep - fudge])
        cylinder(d1 = nut_af / cos(30), d2 = m5_clear,
                 h = (nut_af / cos(30) - m5_clear)/2 + fudge, $fn = 32);
}
// バンパ締結ナットトラップ (軸 X、端板厚の範囲内) — child_cam_bridge.scad の bump_nut()
// (2026-09-04 修正済みの版。穴長は end_plate_t、トラップは外面から nut_dep のみ)
module bump_nut(sign, y) {
    ang = -90 * sign;
    translate([sign * (wing_x1 + fudge), y, bump_bolt_z]) rotate([0, ang, 0])
        cylinder(d = m5_clear, h = end_plate_t + 2 * fudge, $fn = 32);
    translate([sign * (wing_x1 + fudge), y, bump_bolt_z]) rotate([0, ang, 0])
        cylinder(d = nut_af / cos(30), h = nut_dep + fudge, $fn = 6);
}
module small_holes() {
    column_holes();
    for (s = [-1, 1], dx = [-mount_hole_dx, mount_hole_dx], y = mount_hole_y)
        mount_bolt(s * lens_x + dx, y);
    for (s = [-1, 1], y = bump_bolt_y) bump_nut(s, y);
}

// ---- finish 段 ---------------------------------------------------------
module preserve_cuts() {
    intersection() { obstacle_declared(); ds_clip(); }
    small_holes();
}

// ---- 出力 --------------------------------------------------------------
if (part == "preserve" || part == "preserve_solid") preserve_all();
else if (part == "obstacle") obstacle_all();
else if (part == "design_space") design_space();
else if (part == "preserve_cuts") preserve_cuts();
else {
    color("green") preserve_all();
    color("red", 0.5) obstacle_all();
    %design_space();
}
